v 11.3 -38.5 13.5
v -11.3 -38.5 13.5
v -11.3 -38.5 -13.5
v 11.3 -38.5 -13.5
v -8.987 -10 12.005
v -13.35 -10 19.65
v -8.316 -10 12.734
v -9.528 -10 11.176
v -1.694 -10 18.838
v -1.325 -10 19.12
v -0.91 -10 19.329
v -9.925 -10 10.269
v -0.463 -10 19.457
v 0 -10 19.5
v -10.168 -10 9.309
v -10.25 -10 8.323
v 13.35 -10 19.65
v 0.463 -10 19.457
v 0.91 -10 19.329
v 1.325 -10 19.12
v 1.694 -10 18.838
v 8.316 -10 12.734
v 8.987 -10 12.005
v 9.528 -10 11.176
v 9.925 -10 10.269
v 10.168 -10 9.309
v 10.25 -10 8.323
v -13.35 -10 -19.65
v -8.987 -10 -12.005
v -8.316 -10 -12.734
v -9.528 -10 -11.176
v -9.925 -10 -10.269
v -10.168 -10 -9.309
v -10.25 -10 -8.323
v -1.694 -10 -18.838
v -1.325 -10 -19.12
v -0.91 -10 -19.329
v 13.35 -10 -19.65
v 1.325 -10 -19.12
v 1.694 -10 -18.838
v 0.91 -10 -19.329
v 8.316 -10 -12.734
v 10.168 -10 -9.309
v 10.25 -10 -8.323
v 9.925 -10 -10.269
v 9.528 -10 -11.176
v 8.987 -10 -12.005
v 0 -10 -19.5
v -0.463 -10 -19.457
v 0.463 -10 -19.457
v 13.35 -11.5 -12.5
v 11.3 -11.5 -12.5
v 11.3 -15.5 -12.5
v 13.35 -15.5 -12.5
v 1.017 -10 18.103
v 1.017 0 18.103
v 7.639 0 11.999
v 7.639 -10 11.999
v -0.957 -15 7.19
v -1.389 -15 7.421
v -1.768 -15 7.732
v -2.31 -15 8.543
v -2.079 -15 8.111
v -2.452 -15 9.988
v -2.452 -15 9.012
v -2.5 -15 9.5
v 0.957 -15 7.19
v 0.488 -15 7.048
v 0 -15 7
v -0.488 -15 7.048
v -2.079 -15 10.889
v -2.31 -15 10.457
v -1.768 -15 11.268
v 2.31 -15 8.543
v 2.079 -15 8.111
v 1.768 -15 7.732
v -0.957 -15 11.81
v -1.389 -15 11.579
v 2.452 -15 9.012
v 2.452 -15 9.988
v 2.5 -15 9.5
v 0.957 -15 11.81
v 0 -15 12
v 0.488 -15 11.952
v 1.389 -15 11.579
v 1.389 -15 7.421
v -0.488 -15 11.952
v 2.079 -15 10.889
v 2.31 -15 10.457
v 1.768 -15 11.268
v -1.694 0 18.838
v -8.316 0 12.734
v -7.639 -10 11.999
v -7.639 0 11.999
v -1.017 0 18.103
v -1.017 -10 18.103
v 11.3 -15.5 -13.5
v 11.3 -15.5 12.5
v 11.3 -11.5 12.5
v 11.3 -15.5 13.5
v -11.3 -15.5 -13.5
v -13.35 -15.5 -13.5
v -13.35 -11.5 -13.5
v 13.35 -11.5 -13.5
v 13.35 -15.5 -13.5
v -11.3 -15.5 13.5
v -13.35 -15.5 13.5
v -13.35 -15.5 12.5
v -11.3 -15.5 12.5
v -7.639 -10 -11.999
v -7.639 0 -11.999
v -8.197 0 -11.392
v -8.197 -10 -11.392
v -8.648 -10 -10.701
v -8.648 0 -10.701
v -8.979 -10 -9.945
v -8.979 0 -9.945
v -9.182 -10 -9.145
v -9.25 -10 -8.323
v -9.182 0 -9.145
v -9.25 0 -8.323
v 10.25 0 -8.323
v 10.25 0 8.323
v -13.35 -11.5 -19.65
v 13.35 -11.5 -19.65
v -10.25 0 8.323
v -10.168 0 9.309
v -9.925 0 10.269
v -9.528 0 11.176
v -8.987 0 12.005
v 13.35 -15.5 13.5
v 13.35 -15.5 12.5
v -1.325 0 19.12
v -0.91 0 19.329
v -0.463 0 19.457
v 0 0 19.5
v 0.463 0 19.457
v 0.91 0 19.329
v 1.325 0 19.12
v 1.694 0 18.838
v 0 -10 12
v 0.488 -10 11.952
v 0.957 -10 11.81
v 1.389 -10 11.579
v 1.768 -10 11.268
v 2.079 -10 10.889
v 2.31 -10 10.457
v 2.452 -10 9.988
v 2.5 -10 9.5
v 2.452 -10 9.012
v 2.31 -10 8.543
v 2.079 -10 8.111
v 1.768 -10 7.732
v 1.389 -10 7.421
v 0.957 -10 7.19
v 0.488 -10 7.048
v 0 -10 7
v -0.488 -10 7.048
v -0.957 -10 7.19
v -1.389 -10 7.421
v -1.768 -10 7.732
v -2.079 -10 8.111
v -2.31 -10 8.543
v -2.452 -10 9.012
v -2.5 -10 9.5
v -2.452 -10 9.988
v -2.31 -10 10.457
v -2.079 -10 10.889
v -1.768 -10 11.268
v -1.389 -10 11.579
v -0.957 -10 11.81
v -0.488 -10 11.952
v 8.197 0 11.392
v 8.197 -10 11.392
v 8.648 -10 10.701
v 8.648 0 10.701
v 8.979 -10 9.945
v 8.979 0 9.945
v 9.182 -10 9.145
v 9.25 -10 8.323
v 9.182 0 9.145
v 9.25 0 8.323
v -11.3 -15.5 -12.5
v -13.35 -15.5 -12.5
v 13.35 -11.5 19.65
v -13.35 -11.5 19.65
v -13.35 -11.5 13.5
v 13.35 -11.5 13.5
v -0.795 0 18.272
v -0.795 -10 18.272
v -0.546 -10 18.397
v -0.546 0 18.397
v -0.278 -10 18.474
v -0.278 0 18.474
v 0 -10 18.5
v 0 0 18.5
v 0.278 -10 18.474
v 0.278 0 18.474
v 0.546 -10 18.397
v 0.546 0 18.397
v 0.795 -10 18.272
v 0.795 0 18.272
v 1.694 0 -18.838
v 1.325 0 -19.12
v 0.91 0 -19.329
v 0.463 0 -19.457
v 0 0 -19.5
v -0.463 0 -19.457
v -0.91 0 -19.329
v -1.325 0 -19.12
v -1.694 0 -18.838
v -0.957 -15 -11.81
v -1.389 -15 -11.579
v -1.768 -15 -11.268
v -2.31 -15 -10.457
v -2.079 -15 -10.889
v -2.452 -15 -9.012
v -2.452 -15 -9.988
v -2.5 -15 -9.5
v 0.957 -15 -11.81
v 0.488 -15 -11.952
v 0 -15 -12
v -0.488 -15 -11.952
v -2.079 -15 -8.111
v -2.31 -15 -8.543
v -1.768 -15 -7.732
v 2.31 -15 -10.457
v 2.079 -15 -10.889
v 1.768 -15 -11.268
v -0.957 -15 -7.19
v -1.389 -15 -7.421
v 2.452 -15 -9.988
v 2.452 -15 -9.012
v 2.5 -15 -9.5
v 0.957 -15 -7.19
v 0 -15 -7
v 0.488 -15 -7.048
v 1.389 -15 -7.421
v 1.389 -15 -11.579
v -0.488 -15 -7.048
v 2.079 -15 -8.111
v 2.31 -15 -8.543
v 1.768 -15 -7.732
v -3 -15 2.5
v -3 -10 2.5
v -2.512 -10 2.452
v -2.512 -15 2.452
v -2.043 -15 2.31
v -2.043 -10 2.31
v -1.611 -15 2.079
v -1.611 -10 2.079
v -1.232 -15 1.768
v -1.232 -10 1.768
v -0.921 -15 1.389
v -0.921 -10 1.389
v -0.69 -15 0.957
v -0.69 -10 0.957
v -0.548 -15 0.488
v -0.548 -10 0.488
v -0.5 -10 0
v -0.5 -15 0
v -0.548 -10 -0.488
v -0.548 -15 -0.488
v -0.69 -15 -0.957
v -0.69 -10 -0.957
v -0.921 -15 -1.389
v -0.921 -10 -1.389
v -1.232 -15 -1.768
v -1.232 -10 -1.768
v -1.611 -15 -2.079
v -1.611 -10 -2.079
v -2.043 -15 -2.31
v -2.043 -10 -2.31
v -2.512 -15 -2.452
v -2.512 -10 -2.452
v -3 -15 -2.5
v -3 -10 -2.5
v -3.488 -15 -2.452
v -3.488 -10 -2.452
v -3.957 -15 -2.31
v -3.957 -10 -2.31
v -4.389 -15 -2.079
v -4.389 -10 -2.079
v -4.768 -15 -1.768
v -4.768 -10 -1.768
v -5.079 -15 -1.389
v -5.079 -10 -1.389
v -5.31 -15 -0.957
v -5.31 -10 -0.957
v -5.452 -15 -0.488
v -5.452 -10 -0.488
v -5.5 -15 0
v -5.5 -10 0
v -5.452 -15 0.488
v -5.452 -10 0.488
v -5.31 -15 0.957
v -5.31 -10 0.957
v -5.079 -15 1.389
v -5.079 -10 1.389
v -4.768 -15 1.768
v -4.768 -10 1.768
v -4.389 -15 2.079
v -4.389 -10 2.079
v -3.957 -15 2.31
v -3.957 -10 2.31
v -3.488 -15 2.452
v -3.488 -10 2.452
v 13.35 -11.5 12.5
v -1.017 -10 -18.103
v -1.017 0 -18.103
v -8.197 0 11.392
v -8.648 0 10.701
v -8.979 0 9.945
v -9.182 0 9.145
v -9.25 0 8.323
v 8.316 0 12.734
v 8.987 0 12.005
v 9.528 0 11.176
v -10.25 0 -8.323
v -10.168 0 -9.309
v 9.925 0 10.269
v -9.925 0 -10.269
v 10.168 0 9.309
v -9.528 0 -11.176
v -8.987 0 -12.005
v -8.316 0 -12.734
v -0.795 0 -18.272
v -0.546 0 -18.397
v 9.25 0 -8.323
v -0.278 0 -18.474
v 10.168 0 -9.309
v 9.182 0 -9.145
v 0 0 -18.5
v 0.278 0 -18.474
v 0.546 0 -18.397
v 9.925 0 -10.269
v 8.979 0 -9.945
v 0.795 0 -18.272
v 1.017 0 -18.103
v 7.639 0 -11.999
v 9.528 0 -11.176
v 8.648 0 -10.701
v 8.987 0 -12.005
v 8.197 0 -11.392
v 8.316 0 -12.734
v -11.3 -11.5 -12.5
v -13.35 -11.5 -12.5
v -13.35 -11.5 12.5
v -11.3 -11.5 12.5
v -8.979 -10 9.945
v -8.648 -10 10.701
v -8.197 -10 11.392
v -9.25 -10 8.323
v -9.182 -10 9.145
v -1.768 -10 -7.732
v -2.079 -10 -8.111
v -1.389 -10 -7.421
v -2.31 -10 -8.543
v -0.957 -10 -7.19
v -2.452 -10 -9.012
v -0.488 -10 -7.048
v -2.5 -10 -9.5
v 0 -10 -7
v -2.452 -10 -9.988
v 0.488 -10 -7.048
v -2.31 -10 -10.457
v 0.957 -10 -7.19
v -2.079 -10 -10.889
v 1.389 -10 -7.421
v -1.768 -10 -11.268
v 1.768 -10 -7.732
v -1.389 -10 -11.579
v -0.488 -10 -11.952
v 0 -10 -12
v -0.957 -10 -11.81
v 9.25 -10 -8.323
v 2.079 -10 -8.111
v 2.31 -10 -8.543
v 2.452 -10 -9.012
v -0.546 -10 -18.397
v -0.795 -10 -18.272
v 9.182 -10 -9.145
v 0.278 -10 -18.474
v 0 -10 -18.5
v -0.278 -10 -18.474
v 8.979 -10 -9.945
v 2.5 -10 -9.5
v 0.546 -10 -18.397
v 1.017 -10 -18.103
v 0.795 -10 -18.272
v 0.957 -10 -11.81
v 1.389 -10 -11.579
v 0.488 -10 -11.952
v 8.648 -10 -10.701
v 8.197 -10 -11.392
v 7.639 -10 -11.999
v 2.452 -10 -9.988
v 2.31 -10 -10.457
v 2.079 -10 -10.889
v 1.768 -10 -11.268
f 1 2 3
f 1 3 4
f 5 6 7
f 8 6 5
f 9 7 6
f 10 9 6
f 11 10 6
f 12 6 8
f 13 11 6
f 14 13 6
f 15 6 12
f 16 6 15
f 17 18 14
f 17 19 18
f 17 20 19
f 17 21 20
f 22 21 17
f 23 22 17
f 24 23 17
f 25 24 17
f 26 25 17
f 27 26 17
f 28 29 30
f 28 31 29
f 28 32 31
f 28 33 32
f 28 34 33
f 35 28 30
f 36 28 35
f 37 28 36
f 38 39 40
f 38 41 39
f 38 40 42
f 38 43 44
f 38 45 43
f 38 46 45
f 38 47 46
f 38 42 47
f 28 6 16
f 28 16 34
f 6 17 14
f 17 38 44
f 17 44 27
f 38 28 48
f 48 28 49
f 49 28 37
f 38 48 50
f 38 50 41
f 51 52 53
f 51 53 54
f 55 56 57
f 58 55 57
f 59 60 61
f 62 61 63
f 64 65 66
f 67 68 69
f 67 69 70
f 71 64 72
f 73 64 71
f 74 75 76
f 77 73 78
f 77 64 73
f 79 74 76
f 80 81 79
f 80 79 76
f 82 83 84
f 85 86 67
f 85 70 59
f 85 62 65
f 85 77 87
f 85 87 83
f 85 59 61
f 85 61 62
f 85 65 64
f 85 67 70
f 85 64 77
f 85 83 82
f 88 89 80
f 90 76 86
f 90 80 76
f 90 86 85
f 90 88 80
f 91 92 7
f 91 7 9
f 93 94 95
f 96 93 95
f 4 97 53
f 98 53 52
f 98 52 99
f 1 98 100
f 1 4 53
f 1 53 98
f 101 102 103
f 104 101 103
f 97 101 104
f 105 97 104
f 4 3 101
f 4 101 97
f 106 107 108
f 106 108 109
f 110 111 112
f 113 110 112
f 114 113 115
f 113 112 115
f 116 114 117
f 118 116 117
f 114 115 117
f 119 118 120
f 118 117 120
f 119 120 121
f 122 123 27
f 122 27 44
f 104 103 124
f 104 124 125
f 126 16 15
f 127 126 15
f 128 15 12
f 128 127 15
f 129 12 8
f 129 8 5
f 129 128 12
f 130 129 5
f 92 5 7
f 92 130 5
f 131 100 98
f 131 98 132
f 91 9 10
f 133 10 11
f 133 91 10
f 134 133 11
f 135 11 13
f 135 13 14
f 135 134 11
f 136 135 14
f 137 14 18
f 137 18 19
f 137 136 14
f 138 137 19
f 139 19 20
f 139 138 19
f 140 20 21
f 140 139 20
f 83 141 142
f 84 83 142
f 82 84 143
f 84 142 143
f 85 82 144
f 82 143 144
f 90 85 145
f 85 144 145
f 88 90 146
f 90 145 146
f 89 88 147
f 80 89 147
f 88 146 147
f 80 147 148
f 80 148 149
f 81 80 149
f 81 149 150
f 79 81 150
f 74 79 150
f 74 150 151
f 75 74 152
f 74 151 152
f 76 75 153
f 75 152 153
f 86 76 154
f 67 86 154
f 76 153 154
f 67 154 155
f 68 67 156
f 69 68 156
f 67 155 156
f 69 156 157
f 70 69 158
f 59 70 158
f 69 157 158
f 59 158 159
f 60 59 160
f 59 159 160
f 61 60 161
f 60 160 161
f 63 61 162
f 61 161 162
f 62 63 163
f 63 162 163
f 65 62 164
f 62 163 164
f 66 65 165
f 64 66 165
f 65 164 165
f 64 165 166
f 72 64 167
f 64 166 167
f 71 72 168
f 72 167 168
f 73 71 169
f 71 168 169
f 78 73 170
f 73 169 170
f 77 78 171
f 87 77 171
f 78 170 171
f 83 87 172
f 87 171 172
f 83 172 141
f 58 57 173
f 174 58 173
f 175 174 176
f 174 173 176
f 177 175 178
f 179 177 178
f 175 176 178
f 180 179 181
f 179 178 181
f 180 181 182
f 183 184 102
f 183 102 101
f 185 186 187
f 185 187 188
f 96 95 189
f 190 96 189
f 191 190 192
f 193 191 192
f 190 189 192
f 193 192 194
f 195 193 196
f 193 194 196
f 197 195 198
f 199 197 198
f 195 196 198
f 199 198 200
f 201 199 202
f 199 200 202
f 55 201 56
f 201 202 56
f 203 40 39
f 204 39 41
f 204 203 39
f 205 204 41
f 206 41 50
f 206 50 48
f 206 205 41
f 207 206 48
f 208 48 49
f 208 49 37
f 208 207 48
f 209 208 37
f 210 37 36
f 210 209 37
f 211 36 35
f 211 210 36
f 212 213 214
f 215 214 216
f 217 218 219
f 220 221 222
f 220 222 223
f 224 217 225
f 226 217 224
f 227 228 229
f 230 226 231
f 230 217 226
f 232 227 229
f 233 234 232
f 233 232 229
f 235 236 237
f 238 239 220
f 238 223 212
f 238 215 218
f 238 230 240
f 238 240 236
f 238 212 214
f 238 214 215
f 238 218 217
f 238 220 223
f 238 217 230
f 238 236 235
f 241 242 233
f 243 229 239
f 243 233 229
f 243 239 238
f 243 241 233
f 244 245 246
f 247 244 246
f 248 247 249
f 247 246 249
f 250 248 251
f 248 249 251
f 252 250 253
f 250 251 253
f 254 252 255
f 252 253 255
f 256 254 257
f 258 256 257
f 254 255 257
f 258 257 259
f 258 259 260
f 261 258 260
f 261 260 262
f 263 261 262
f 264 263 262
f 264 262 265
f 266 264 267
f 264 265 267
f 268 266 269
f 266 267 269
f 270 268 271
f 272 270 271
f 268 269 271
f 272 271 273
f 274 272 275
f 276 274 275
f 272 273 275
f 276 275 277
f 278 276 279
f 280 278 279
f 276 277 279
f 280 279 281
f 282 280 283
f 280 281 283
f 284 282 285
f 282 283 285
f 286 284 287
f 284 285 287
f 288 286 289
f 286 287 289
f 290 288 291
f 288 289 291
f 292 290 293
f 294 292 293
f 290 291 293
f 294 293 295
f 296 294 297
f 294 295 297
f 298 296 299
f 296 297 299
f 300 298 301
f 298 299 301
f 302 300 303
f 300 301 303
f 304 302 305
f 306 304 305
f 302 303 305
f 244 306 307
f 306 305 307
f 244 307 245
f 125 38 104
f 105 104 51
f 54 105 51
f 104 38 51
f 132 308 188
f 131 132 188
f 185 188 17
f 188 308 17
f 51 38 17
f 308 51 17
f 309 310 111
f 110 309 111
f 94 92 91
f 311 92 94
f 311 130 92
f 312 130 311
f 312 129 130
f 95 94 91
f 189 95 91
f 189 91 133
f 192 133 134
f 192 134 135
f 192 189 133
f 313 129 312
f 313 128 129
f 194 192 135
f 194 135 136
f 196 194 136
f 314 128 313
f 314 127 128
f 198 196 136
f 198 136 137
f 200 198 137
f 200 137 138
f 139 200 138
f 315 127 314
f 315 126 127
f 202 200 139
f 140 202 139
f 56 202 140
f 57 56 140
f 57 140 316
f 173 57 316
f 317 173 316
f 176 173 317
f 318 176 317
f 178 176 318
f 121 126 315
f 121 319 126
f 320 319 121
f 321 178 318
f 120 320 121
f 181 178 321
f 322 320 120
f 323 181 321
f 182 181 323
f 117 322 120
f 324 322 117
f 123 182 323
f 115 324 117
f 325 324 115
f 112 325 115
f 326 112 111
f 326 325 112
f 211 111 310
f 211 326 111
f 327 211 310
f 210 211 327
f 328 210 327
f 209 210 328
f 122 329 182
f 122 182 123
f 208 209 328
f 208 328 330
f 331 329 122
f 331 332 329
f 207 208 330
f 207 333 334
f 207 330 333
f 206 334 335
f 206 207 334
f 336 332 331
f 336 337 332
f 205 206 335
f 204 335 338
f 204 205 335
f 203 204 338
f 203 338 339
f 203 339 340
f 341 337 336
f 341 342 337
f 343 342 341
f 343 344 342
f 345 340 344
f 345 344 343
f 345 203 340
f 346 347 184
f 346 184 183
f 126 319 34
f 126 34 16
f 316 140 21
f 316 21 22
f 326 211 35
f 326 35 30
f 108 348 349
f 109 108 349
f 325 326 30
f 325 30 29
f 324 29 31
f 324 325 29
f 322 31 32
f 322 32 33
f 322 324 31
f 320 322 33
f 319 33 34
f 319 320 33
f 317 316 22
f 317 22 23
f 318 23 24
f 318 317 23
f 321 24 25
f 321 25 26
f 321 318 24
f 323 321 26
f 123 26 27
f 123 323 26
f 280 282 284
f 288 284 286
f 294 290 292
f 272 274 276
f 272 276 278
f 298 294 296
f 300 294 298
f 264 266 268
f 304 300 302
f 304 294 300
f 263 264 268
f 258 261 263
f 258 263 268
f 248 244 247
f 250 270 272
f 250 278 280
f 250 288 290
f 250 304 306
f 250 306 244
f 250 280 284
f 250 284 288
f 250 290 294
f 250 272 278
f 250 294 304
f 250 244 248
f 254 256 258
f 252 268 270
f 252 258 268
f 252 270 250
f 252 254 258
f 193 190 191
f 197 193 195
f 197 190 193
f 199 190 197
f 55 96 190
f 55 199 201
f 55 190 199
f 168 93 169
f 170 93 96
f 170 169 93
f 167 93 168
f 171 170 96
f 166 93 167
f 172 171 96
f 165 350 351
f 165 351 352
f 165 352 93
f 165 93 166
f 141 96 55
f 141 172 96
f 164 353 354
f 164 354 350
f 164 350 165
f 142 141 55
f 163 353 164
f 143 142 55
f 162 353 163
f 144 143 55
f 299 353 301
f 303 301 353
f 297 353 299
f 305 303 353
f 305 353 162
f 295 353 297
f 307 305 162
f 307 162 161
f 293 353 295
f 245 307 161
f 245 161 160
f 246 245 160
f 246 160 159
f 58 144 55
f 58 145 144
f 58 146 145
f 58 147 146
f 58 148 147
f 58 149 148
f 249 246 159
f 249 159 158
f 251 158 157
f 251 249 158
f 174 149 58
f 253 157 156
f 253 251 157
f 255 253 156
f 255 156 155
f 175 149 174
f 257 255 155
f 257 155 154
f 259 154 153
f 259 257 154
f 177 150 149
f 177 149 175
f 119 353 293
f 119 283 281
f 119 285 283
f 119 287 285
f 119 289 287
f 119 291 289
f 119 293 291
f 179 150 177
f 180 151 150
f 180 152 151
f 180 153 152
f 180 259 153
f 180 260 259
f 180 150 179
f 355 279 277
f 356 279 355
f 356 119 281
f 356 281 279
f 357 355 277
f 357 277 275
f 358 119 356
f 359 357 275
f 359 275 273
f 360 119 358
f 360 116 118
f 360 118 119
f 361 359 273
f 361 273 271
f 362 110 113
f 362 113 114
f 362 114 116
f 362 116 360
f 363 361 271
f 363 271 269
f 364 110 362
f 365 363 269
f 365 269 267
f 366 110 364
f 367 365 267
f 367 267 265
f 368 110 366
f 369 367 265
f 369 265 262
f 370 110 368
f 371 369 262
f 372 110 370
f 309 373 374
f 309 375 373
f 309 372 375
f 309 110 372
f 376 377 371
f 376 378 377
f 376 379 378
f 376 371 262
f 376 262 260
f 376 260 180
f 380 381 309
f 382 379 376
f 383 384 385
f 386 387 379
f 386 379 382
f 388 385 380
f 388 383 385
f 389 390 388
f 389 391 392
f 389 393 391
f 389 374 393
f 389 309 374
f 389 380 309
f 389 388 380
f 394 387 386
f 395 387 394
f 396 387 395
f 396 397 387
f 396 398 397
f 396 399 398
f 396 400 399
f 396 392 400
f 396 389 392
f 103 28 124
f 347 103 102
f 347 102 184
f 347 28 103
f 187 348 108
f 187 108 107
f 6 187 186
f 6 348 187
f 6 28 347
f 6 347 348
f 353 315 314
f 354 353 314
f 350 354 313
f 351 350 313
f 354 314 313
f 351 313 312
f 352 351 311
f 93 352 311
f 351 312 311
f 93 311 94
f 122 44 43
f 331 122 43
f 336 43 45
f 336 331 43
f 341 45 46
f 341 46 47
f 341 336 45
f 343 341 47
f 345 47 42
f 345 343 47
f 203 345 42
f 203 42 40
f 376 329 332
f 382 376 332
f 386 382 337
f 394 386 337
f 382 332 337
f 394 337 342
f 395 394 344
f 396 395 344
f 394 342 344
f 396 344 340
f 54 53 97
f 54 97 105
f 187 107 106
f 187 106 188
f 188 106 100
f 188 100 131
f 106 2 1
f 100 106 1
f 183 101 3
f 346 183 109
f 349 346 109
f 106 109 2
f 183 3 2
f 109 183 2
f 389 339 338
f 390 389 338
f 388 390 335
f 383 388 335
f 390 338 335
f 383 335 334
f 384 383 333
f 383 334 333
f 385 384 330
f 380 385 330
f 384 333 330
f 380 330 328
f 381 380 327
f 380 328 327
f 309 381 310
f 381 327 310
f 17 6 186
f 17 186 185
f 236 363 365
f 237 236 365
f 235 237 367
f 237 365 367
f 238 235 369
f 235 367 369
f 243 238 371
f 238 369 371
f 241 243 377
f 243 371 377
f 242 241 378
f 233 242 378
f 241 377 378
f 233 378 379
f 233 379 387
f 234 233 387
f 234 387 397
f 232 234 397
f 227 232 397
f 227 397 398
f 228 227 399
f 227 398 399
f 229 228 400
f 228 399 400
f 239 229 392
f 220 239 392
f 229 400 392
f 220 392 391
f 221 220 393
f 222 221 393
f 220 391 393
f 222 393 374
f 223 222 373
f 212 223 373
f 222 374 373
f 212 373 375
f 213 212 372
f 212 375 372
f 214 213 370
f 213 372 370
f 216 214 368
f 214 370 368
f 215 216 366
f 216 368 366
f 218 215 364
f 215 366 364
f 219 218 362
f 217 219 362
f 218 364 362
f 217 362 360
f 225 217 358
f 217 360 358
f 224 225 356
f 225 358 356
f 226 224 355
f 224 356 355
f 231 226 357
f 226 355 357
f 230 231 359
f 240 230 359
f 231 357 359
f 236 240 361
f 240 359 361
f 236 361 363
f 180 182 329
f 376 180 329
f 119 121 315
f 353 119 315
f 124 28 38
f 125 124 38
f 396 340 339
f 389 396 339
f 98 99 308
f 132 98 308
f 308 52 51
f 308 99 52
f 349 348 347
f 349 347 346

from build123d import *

# Parameters (mm, degrees)
ESBO_O1_W                = 26.7
ESBO_O1_H                = 39.3
RESSALTO_EXTRUS_O1_DEPTH = 38.5
CORTE_EXTRUS_O1_DEPTH    = 10
ESBO_O4_W                = 26.7
ESBO_O4_H                = 39.3
CORTE_EXTRUS_O2_DEPTH    = 10
ESBO_O5_W                = 26.7
ESBO_O5_H                = 39.3
ESBO_O5_W_2              = 22.6
ESBO_O5_H_2              = 27
CORTE_EXTRUS_O4_DEPTH    = 27
ESBO_O6_R                = 2.5
CORTE_EXTRUS_O5_DEPTH    = 5
ESBO_O7_W                = 2.05
ESBO_O7_H                = 1
RESSALTO_EXTRUS_O2_DEPTH = 4


with BuildPart() as part:
    # Esboço1 → Ressalto-extrusão1 (new body)
    with BuildSketch(Plane(origin=(0, 0, 0), x_dir=(1, 0, 0), z_dir=(0, 1, 0))):
        Rectangle(ESBO_O1_W, ESBO_O1_H)
    extrude(amount=-RESSALTO_EXTRUS_O1_DEPTH)

    # Esboço2 → Corte-extrusão1 (cut)
    with BuildSketch(Plane(origin=(0, 0, 0), x_dir=(1, 0, 0), z_dir=(0, 1, 0))):
        with BuildLine():
            Line((1.016622231, -18.102941176), (7.638740771, -11.999086257))
            ThreePointArc((7.638740771, -11.999086257), (8.829503459, -10.32964035), (9.25, -8.322615669))
            Line((9.25, -8.322615669), (9.25, 8.322615669))
            ThreePointArc((9.25, 8.322615669), (8.829503459, 10.32964035), (7.638740771, 11.999086257))
            Line((7.638740771, 11.999086257), (1.016622231, 18.102941176))
            ThreePointArc((1.016622231, 18.102941176), (0, 18.5), (-1.016622231, 18.102941176))
            Line((-1.016622231, 18.102941176), (-7.638740771, 11.999086257))
            ThreePointArc((-7.638740771, 11.999086257), (-8.829503459, 10.32964035), (-9.25, 8.322615669))
            Line((-9.25, 8.322615669), (-9.25, -8.322615669))
            ThreePointArc((-9.25, -8.322615669), (-8.829503459, -10.32964035), (-7.638740771, -11.999086257))
            Line((-7.638740771, -11.999086257), (-1.016622231, -18.102941176))
            ThreePointArc((-1.016622231, -18.102941176), (0, -18.5), (1.016622231, -18.102941176))
        make_face()
    extrude(amount=-CORTE_EXTRUS_O1_DEPTH, mode=Mode.SUBTRACT)

    # Esboço4 → Corte-extrusão2 (cut)
    with BuildSketch(Plane(origin=(0, 0, 0), x_dir=(1, 0, 0), z_dir=(0, 1, 0))):
        Rectangle(ESBO_O4_W, ESBO_O4_H)
        with BuildLine():
            ThreePointArc((-8.316488925, 12.734380374), (-9.74540415, 10.731045286), (-10.25, 8.322615669))
            Line((-10.25, 8.322615669), (-10.25, -8.322615669))
            ThreePointArc((-10.25, -8.322615669), (-9.74540415, -10.731045286), (-8.316488925, -12.734380374))
            Line((-8.316488925, -12.734380374), (-1.694370386, -18.838235294))
            ThreePointArc((-1.694370386, -18.838235294), (0, -19.5), (1.694370386, -18.838235294))
            Line((1.694370386, -18.838235294), (8.316488925, -12.734380374))
            ThreePointArc((8.316488925, -12.734380374), (9.74540415, -10.731045286), (10.25, -8.322615669))
            Line((10.25, -8.322615669), (10.25, 8.322615669))
            ThreePointArc((10.25, 8.322615669), (9.74540415, 10.731045286), (8.316488925, 12.734380374))
            Line((8.316488925, 12.734380374), (1.694370386, 18.838235294))
            ThreePointArc((1.694370386, 18.838235294), (0, 19.5), (-1.694370386, 18.838235294))
            Line((-1.694370386, 18.838235294), (-8.316488925, 12.734380374))
        make_face(mode=Mode.SUBTRACT)
    extrude(amount=-CORTE_EXTRUS_O2_DEPTH, mode=Mode.SUBTRACT)

    # Esboço5 → Corte-extrusão4 (cut)
    with BuildSketch(Plane.XZ.offset(38.5)):
        Rectangle(ESBO_O5_W, ESBO_O5_H)
        Rectangle(ESBO_O5_W_2, ESBO_O5_H_2, mode=Mode.SUBTRACT)
    extrude(amount=-CORTE_EXTRUS_O4_DEPTH, mode=Mode.SUBTRACT)

    # Esboço6 → Corte-extrusão5 (cut)
    with BuildSketch(Plane(origin=(0, -10, 0), x_dir=(1, 0, 0), z_dir=(0, 1, 0))):
        with Locations(Location((0, -9.5, 0), (0, 0, 270))):
            Circle(ESBO_O6_R)
        with Locations(Location((0, 9.5, 0), (0, 0, 270))):
            Circle(ESBO_O6_R)
        with Locations(Location((-3, 0, 0), (0, 0, 270))):
            Circle(ESBO_O6_R)
    extrude(amount=-CORTE_EXTRUS_O5_DEPTH, mode=Mode.SUBTRACT)

    # Esboço7 → Ressalto-extrusão2 (add)
    with BuildSketch(Plane.XZ.offset(11.5)):
        with Locations((12.325, 13)):
            Rectangle(ESBO_O7_W, ESBO_O7_H)
        with Locations((-12.325, 13)):
            Rectangle(ESBO_O7_W, ESBO_O7_H)
        with Locations((-12.325, -13)):
            Rectangle(ESBO_O7_W, ESBO_O7_H)
        with Locations((12.325, -13)):
            Rectangle(ESBO_O7_W, ESBO_O7_H)
    extrude(amount=RESSALTO_EXTRUS_O2_DEPTH)


solid = part.part
